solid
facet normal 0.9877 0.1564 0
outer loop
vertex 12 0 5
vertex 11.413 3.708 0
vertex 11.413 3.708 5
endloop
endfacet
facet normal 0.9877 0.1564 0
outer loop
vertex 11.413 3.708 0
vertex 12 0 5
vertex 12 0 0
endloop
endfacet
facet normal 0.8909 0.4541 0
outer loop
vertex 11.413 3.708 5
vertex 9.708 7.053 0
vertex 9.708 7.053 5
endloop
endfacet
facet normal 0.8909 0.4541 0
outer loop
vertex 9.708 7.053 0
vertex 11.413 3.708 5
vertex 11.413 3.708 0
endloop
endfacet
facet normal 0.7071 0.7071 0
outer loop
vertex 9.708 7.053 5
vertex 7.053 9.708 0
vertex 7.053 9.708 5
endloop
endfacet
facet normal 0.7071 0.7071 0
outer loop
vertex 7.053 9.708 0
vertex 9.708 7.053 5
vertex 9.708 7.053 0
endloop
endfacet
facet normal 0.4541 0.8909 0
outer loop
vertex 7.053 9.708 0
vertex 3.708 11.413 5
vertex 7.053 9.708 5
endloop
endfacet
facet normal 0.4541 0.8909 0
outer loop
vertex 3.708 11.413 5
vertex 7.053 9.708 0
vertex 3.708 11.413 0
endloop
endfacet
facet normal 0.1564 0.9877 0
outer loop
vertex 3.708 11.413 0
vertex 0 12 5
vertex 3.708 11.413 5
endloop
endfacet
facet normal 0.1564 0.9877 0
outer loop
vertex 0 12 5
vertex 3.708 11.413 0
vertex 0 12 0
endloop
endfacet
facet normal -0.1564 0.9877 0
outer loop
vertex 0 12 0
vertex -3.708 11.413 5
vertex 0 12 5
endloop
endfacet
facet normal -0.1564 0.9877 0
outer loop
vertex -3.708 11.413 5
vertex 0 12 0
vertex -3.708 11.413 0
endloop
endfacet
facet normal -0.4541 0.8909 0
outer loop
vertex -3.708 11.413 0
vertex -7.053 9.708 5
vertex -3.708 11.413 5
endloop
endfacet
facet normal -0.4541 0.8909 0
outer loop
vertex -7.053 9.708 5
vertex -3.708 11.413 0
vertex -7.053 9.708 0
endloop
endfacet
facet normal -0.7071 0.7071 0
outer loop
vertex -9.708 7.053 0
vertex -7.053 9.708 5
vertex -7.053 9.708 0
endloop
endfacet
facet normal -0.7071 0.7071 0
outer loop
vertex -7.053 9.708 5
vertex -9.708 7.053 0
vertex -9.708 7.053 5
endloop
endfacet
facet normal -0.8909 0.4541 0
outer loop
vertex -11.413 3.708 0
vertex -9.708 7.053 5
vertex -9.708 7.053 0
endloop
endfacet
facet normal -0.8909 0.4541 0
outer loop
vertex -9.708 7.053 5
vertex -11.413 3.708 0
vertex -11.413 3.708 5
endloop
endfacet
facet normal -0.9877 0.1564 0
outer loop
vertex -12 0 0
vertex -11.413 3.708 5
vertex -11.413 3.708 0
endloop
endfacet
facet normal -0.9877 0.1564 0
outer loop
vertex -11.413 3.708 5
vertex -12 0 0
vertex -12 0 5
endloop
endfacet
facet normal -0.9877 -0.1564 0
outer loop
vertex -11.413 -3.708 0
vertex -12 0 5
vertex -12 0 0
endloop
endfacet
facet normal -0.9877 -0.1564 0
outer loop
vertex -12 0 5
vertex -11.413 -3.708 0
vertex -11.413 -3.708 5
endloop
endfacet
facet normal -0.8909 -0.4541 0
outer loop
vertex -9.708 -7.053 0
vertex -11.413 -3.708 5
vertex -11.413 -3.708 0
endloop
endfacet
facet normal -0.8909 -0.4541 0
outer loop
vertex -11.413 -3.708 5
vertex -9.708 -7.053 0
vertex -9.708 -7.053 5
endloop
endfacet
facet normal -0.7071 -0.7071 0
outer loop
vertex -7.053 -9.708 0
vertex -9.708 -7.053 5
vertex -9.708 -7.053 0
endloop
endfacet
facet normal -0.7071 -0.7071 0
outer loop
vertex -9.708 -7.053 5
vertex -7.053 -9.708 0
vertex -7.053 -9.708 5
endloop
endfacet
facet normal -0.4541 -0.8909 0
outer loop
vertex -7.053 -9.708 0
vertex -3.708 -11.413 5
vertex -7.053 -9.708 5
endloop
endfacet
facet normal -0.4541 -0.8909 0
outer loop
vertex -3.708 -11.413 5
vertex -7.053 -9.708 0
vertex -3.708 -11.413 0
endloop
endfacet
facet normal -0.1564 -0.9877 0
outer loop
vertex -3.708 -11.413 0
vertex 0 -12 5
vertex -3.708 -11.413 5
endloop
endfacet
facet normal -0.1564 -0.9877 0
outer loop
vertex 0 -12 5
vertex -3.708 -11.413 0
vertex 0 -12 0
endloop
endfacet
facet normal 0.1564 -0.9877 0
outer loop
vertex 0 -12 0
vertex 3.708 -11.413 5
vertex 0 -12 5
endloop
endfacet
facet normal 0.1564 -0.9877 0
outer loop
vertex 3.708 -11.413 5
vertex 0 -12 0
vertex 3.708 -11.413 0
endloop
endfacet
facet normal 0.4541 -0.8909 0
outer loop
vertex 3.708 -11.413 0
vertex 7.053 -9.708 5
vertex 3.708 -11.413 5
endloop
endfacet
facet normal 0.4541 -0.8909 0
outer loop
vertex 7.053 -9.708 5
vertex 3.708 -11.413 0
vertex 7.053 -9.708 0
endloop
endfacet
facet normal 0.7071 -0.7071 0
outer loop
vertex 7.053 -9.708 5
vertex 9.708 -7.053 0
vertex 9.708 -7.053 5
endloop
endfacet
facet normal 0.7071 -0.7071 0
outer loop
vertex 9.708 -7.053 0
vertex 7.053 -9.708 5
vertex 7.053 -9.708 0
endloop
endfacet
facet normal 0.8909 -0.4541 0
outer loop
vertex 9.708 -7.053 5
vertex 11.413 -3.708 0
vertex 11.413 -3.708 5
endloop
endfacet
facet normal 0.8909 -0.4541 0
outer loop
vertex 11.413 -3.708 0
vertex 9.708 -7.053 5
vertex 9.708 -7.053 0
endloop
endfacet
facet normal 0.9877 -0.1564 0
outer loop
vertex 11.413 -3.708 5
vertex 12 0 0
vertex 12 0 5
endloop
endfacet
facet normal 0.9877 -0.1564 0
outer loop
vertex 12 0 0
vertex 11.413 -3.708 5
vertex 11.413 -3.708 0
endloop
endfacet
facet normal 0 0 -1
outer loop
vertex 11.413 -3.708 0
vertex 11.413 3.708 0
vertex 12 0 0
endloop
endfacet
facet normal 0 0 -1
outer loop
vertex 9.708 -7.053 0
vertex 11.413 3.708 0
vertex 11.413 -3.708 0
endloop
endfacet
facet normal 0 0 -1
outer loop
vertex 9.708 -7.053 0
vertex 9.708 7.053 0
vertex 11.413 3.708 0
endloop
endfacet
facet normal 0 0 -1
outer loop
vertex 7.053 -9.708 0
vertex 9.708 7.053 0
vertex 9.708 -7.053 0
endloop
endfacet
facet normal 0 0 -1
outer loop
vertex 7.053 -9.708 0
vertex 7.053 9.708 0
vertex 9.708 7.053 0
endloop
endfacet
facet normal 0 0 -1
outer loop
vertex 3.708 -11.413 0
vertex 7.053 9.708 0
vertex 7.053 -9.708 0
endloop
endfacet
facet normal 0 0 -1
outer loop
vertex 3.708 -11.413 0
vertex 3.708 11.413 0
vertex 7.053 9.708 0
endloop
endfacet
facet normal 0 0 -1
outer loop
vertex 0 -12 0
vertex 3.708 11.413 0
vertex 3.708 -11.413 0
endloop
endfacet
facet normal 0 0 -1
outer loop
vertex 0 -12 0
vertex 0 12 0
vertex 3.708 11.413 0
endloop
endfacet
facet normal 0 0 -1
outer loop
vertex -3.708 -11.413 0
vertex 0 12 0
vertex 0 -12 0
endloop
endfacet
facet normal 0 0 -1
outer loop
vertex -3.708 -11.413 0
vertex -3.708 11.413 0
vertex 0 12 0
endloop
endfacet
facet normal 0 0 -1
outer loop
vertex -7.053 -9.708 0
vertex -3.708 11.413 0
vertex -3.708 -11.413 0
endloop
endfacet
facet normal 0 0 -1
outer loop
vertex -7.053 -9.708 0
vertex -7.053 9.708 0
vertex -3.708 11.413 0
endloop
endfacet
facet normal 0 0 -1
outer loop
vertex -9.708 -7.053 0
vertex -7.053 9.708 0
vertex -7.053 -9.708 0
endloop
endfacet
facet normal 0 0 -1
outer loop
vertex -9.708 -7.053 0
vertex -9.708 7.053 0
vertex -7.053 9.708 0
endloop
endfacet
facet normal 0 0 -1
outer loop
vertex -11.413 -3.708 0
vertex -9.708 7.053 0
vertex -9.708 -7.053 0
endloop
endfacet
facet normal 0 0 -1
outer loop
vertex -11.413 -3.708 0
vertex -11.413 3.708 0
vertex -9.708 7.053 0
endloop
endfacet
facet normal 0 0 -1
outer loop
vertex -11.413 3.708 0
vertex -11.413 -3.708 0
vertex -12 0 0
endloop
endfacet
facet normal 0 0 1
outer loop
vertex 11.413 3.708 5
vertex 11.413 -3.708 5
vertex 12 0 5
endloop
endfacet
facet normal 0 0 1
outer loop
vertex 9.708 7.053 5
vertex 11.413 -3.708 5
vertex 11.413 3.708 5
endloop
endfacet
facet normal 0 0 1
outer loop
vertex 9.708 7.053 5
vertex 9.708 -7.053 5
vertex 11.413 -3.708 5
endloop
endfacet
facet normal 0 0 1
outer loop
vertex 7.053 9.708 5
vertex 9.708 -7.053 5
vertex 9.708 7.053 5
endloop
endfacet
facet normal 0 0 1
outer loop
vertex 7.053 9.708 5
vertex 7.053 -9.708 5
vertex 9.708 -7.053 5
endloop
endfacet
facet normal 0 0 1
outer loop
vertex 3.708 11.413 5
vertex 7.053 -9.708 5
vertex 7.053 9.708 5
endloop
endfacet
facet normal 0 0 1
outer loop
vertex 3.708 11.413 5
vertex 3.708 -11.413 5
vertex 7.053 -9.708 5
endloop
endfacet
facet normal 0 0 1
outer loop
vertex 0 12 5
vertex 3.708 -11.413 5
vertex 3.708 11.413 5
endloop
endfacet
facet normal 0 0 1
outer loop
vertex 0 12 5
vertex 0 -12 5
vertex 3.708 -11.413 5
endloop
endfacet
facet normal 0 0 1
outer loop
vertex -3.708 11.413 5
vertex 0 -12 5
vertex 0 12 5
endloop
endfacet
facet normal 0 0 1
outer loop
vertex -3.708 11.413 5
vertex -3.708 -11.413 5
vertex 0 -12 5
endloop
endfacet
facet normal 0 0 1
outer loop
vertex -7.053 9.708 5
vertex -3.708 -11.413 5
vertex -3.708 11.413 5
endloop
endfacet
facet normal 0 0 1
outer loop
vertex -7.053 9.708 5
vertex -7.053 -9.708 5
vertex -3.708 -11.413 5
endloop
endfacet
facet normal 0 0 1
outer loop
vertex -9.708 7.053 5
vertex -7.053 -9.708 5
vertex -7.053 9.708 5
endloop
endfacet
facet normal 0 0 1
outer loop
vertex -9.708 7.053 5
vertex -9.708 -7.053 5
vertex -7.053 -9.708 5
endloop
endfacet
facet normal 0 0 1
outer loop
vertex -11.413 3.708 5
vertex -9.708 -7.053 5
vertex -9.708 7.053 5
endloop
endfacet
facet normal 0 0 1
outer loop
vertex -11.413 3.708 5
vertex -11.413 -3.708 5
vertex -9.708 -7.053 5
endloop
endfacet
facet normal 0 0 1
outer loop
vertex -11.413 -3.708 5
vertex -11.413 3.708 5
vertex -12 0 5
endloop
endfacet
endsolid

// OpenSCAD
//The diameter of the flue.
diameter = 24.0;
height = 5;

/* [OpenSCAD] [Quality] */
$fn = 20;

module CylinderDispenser_Dispenser_Virgin_Hearth_Inner(diameter, height){
	cylinder(d=diameter, h=height);
}

CylinderDispenser_Dispenser_Virgin_Hearth_Inner(diameter, height);
